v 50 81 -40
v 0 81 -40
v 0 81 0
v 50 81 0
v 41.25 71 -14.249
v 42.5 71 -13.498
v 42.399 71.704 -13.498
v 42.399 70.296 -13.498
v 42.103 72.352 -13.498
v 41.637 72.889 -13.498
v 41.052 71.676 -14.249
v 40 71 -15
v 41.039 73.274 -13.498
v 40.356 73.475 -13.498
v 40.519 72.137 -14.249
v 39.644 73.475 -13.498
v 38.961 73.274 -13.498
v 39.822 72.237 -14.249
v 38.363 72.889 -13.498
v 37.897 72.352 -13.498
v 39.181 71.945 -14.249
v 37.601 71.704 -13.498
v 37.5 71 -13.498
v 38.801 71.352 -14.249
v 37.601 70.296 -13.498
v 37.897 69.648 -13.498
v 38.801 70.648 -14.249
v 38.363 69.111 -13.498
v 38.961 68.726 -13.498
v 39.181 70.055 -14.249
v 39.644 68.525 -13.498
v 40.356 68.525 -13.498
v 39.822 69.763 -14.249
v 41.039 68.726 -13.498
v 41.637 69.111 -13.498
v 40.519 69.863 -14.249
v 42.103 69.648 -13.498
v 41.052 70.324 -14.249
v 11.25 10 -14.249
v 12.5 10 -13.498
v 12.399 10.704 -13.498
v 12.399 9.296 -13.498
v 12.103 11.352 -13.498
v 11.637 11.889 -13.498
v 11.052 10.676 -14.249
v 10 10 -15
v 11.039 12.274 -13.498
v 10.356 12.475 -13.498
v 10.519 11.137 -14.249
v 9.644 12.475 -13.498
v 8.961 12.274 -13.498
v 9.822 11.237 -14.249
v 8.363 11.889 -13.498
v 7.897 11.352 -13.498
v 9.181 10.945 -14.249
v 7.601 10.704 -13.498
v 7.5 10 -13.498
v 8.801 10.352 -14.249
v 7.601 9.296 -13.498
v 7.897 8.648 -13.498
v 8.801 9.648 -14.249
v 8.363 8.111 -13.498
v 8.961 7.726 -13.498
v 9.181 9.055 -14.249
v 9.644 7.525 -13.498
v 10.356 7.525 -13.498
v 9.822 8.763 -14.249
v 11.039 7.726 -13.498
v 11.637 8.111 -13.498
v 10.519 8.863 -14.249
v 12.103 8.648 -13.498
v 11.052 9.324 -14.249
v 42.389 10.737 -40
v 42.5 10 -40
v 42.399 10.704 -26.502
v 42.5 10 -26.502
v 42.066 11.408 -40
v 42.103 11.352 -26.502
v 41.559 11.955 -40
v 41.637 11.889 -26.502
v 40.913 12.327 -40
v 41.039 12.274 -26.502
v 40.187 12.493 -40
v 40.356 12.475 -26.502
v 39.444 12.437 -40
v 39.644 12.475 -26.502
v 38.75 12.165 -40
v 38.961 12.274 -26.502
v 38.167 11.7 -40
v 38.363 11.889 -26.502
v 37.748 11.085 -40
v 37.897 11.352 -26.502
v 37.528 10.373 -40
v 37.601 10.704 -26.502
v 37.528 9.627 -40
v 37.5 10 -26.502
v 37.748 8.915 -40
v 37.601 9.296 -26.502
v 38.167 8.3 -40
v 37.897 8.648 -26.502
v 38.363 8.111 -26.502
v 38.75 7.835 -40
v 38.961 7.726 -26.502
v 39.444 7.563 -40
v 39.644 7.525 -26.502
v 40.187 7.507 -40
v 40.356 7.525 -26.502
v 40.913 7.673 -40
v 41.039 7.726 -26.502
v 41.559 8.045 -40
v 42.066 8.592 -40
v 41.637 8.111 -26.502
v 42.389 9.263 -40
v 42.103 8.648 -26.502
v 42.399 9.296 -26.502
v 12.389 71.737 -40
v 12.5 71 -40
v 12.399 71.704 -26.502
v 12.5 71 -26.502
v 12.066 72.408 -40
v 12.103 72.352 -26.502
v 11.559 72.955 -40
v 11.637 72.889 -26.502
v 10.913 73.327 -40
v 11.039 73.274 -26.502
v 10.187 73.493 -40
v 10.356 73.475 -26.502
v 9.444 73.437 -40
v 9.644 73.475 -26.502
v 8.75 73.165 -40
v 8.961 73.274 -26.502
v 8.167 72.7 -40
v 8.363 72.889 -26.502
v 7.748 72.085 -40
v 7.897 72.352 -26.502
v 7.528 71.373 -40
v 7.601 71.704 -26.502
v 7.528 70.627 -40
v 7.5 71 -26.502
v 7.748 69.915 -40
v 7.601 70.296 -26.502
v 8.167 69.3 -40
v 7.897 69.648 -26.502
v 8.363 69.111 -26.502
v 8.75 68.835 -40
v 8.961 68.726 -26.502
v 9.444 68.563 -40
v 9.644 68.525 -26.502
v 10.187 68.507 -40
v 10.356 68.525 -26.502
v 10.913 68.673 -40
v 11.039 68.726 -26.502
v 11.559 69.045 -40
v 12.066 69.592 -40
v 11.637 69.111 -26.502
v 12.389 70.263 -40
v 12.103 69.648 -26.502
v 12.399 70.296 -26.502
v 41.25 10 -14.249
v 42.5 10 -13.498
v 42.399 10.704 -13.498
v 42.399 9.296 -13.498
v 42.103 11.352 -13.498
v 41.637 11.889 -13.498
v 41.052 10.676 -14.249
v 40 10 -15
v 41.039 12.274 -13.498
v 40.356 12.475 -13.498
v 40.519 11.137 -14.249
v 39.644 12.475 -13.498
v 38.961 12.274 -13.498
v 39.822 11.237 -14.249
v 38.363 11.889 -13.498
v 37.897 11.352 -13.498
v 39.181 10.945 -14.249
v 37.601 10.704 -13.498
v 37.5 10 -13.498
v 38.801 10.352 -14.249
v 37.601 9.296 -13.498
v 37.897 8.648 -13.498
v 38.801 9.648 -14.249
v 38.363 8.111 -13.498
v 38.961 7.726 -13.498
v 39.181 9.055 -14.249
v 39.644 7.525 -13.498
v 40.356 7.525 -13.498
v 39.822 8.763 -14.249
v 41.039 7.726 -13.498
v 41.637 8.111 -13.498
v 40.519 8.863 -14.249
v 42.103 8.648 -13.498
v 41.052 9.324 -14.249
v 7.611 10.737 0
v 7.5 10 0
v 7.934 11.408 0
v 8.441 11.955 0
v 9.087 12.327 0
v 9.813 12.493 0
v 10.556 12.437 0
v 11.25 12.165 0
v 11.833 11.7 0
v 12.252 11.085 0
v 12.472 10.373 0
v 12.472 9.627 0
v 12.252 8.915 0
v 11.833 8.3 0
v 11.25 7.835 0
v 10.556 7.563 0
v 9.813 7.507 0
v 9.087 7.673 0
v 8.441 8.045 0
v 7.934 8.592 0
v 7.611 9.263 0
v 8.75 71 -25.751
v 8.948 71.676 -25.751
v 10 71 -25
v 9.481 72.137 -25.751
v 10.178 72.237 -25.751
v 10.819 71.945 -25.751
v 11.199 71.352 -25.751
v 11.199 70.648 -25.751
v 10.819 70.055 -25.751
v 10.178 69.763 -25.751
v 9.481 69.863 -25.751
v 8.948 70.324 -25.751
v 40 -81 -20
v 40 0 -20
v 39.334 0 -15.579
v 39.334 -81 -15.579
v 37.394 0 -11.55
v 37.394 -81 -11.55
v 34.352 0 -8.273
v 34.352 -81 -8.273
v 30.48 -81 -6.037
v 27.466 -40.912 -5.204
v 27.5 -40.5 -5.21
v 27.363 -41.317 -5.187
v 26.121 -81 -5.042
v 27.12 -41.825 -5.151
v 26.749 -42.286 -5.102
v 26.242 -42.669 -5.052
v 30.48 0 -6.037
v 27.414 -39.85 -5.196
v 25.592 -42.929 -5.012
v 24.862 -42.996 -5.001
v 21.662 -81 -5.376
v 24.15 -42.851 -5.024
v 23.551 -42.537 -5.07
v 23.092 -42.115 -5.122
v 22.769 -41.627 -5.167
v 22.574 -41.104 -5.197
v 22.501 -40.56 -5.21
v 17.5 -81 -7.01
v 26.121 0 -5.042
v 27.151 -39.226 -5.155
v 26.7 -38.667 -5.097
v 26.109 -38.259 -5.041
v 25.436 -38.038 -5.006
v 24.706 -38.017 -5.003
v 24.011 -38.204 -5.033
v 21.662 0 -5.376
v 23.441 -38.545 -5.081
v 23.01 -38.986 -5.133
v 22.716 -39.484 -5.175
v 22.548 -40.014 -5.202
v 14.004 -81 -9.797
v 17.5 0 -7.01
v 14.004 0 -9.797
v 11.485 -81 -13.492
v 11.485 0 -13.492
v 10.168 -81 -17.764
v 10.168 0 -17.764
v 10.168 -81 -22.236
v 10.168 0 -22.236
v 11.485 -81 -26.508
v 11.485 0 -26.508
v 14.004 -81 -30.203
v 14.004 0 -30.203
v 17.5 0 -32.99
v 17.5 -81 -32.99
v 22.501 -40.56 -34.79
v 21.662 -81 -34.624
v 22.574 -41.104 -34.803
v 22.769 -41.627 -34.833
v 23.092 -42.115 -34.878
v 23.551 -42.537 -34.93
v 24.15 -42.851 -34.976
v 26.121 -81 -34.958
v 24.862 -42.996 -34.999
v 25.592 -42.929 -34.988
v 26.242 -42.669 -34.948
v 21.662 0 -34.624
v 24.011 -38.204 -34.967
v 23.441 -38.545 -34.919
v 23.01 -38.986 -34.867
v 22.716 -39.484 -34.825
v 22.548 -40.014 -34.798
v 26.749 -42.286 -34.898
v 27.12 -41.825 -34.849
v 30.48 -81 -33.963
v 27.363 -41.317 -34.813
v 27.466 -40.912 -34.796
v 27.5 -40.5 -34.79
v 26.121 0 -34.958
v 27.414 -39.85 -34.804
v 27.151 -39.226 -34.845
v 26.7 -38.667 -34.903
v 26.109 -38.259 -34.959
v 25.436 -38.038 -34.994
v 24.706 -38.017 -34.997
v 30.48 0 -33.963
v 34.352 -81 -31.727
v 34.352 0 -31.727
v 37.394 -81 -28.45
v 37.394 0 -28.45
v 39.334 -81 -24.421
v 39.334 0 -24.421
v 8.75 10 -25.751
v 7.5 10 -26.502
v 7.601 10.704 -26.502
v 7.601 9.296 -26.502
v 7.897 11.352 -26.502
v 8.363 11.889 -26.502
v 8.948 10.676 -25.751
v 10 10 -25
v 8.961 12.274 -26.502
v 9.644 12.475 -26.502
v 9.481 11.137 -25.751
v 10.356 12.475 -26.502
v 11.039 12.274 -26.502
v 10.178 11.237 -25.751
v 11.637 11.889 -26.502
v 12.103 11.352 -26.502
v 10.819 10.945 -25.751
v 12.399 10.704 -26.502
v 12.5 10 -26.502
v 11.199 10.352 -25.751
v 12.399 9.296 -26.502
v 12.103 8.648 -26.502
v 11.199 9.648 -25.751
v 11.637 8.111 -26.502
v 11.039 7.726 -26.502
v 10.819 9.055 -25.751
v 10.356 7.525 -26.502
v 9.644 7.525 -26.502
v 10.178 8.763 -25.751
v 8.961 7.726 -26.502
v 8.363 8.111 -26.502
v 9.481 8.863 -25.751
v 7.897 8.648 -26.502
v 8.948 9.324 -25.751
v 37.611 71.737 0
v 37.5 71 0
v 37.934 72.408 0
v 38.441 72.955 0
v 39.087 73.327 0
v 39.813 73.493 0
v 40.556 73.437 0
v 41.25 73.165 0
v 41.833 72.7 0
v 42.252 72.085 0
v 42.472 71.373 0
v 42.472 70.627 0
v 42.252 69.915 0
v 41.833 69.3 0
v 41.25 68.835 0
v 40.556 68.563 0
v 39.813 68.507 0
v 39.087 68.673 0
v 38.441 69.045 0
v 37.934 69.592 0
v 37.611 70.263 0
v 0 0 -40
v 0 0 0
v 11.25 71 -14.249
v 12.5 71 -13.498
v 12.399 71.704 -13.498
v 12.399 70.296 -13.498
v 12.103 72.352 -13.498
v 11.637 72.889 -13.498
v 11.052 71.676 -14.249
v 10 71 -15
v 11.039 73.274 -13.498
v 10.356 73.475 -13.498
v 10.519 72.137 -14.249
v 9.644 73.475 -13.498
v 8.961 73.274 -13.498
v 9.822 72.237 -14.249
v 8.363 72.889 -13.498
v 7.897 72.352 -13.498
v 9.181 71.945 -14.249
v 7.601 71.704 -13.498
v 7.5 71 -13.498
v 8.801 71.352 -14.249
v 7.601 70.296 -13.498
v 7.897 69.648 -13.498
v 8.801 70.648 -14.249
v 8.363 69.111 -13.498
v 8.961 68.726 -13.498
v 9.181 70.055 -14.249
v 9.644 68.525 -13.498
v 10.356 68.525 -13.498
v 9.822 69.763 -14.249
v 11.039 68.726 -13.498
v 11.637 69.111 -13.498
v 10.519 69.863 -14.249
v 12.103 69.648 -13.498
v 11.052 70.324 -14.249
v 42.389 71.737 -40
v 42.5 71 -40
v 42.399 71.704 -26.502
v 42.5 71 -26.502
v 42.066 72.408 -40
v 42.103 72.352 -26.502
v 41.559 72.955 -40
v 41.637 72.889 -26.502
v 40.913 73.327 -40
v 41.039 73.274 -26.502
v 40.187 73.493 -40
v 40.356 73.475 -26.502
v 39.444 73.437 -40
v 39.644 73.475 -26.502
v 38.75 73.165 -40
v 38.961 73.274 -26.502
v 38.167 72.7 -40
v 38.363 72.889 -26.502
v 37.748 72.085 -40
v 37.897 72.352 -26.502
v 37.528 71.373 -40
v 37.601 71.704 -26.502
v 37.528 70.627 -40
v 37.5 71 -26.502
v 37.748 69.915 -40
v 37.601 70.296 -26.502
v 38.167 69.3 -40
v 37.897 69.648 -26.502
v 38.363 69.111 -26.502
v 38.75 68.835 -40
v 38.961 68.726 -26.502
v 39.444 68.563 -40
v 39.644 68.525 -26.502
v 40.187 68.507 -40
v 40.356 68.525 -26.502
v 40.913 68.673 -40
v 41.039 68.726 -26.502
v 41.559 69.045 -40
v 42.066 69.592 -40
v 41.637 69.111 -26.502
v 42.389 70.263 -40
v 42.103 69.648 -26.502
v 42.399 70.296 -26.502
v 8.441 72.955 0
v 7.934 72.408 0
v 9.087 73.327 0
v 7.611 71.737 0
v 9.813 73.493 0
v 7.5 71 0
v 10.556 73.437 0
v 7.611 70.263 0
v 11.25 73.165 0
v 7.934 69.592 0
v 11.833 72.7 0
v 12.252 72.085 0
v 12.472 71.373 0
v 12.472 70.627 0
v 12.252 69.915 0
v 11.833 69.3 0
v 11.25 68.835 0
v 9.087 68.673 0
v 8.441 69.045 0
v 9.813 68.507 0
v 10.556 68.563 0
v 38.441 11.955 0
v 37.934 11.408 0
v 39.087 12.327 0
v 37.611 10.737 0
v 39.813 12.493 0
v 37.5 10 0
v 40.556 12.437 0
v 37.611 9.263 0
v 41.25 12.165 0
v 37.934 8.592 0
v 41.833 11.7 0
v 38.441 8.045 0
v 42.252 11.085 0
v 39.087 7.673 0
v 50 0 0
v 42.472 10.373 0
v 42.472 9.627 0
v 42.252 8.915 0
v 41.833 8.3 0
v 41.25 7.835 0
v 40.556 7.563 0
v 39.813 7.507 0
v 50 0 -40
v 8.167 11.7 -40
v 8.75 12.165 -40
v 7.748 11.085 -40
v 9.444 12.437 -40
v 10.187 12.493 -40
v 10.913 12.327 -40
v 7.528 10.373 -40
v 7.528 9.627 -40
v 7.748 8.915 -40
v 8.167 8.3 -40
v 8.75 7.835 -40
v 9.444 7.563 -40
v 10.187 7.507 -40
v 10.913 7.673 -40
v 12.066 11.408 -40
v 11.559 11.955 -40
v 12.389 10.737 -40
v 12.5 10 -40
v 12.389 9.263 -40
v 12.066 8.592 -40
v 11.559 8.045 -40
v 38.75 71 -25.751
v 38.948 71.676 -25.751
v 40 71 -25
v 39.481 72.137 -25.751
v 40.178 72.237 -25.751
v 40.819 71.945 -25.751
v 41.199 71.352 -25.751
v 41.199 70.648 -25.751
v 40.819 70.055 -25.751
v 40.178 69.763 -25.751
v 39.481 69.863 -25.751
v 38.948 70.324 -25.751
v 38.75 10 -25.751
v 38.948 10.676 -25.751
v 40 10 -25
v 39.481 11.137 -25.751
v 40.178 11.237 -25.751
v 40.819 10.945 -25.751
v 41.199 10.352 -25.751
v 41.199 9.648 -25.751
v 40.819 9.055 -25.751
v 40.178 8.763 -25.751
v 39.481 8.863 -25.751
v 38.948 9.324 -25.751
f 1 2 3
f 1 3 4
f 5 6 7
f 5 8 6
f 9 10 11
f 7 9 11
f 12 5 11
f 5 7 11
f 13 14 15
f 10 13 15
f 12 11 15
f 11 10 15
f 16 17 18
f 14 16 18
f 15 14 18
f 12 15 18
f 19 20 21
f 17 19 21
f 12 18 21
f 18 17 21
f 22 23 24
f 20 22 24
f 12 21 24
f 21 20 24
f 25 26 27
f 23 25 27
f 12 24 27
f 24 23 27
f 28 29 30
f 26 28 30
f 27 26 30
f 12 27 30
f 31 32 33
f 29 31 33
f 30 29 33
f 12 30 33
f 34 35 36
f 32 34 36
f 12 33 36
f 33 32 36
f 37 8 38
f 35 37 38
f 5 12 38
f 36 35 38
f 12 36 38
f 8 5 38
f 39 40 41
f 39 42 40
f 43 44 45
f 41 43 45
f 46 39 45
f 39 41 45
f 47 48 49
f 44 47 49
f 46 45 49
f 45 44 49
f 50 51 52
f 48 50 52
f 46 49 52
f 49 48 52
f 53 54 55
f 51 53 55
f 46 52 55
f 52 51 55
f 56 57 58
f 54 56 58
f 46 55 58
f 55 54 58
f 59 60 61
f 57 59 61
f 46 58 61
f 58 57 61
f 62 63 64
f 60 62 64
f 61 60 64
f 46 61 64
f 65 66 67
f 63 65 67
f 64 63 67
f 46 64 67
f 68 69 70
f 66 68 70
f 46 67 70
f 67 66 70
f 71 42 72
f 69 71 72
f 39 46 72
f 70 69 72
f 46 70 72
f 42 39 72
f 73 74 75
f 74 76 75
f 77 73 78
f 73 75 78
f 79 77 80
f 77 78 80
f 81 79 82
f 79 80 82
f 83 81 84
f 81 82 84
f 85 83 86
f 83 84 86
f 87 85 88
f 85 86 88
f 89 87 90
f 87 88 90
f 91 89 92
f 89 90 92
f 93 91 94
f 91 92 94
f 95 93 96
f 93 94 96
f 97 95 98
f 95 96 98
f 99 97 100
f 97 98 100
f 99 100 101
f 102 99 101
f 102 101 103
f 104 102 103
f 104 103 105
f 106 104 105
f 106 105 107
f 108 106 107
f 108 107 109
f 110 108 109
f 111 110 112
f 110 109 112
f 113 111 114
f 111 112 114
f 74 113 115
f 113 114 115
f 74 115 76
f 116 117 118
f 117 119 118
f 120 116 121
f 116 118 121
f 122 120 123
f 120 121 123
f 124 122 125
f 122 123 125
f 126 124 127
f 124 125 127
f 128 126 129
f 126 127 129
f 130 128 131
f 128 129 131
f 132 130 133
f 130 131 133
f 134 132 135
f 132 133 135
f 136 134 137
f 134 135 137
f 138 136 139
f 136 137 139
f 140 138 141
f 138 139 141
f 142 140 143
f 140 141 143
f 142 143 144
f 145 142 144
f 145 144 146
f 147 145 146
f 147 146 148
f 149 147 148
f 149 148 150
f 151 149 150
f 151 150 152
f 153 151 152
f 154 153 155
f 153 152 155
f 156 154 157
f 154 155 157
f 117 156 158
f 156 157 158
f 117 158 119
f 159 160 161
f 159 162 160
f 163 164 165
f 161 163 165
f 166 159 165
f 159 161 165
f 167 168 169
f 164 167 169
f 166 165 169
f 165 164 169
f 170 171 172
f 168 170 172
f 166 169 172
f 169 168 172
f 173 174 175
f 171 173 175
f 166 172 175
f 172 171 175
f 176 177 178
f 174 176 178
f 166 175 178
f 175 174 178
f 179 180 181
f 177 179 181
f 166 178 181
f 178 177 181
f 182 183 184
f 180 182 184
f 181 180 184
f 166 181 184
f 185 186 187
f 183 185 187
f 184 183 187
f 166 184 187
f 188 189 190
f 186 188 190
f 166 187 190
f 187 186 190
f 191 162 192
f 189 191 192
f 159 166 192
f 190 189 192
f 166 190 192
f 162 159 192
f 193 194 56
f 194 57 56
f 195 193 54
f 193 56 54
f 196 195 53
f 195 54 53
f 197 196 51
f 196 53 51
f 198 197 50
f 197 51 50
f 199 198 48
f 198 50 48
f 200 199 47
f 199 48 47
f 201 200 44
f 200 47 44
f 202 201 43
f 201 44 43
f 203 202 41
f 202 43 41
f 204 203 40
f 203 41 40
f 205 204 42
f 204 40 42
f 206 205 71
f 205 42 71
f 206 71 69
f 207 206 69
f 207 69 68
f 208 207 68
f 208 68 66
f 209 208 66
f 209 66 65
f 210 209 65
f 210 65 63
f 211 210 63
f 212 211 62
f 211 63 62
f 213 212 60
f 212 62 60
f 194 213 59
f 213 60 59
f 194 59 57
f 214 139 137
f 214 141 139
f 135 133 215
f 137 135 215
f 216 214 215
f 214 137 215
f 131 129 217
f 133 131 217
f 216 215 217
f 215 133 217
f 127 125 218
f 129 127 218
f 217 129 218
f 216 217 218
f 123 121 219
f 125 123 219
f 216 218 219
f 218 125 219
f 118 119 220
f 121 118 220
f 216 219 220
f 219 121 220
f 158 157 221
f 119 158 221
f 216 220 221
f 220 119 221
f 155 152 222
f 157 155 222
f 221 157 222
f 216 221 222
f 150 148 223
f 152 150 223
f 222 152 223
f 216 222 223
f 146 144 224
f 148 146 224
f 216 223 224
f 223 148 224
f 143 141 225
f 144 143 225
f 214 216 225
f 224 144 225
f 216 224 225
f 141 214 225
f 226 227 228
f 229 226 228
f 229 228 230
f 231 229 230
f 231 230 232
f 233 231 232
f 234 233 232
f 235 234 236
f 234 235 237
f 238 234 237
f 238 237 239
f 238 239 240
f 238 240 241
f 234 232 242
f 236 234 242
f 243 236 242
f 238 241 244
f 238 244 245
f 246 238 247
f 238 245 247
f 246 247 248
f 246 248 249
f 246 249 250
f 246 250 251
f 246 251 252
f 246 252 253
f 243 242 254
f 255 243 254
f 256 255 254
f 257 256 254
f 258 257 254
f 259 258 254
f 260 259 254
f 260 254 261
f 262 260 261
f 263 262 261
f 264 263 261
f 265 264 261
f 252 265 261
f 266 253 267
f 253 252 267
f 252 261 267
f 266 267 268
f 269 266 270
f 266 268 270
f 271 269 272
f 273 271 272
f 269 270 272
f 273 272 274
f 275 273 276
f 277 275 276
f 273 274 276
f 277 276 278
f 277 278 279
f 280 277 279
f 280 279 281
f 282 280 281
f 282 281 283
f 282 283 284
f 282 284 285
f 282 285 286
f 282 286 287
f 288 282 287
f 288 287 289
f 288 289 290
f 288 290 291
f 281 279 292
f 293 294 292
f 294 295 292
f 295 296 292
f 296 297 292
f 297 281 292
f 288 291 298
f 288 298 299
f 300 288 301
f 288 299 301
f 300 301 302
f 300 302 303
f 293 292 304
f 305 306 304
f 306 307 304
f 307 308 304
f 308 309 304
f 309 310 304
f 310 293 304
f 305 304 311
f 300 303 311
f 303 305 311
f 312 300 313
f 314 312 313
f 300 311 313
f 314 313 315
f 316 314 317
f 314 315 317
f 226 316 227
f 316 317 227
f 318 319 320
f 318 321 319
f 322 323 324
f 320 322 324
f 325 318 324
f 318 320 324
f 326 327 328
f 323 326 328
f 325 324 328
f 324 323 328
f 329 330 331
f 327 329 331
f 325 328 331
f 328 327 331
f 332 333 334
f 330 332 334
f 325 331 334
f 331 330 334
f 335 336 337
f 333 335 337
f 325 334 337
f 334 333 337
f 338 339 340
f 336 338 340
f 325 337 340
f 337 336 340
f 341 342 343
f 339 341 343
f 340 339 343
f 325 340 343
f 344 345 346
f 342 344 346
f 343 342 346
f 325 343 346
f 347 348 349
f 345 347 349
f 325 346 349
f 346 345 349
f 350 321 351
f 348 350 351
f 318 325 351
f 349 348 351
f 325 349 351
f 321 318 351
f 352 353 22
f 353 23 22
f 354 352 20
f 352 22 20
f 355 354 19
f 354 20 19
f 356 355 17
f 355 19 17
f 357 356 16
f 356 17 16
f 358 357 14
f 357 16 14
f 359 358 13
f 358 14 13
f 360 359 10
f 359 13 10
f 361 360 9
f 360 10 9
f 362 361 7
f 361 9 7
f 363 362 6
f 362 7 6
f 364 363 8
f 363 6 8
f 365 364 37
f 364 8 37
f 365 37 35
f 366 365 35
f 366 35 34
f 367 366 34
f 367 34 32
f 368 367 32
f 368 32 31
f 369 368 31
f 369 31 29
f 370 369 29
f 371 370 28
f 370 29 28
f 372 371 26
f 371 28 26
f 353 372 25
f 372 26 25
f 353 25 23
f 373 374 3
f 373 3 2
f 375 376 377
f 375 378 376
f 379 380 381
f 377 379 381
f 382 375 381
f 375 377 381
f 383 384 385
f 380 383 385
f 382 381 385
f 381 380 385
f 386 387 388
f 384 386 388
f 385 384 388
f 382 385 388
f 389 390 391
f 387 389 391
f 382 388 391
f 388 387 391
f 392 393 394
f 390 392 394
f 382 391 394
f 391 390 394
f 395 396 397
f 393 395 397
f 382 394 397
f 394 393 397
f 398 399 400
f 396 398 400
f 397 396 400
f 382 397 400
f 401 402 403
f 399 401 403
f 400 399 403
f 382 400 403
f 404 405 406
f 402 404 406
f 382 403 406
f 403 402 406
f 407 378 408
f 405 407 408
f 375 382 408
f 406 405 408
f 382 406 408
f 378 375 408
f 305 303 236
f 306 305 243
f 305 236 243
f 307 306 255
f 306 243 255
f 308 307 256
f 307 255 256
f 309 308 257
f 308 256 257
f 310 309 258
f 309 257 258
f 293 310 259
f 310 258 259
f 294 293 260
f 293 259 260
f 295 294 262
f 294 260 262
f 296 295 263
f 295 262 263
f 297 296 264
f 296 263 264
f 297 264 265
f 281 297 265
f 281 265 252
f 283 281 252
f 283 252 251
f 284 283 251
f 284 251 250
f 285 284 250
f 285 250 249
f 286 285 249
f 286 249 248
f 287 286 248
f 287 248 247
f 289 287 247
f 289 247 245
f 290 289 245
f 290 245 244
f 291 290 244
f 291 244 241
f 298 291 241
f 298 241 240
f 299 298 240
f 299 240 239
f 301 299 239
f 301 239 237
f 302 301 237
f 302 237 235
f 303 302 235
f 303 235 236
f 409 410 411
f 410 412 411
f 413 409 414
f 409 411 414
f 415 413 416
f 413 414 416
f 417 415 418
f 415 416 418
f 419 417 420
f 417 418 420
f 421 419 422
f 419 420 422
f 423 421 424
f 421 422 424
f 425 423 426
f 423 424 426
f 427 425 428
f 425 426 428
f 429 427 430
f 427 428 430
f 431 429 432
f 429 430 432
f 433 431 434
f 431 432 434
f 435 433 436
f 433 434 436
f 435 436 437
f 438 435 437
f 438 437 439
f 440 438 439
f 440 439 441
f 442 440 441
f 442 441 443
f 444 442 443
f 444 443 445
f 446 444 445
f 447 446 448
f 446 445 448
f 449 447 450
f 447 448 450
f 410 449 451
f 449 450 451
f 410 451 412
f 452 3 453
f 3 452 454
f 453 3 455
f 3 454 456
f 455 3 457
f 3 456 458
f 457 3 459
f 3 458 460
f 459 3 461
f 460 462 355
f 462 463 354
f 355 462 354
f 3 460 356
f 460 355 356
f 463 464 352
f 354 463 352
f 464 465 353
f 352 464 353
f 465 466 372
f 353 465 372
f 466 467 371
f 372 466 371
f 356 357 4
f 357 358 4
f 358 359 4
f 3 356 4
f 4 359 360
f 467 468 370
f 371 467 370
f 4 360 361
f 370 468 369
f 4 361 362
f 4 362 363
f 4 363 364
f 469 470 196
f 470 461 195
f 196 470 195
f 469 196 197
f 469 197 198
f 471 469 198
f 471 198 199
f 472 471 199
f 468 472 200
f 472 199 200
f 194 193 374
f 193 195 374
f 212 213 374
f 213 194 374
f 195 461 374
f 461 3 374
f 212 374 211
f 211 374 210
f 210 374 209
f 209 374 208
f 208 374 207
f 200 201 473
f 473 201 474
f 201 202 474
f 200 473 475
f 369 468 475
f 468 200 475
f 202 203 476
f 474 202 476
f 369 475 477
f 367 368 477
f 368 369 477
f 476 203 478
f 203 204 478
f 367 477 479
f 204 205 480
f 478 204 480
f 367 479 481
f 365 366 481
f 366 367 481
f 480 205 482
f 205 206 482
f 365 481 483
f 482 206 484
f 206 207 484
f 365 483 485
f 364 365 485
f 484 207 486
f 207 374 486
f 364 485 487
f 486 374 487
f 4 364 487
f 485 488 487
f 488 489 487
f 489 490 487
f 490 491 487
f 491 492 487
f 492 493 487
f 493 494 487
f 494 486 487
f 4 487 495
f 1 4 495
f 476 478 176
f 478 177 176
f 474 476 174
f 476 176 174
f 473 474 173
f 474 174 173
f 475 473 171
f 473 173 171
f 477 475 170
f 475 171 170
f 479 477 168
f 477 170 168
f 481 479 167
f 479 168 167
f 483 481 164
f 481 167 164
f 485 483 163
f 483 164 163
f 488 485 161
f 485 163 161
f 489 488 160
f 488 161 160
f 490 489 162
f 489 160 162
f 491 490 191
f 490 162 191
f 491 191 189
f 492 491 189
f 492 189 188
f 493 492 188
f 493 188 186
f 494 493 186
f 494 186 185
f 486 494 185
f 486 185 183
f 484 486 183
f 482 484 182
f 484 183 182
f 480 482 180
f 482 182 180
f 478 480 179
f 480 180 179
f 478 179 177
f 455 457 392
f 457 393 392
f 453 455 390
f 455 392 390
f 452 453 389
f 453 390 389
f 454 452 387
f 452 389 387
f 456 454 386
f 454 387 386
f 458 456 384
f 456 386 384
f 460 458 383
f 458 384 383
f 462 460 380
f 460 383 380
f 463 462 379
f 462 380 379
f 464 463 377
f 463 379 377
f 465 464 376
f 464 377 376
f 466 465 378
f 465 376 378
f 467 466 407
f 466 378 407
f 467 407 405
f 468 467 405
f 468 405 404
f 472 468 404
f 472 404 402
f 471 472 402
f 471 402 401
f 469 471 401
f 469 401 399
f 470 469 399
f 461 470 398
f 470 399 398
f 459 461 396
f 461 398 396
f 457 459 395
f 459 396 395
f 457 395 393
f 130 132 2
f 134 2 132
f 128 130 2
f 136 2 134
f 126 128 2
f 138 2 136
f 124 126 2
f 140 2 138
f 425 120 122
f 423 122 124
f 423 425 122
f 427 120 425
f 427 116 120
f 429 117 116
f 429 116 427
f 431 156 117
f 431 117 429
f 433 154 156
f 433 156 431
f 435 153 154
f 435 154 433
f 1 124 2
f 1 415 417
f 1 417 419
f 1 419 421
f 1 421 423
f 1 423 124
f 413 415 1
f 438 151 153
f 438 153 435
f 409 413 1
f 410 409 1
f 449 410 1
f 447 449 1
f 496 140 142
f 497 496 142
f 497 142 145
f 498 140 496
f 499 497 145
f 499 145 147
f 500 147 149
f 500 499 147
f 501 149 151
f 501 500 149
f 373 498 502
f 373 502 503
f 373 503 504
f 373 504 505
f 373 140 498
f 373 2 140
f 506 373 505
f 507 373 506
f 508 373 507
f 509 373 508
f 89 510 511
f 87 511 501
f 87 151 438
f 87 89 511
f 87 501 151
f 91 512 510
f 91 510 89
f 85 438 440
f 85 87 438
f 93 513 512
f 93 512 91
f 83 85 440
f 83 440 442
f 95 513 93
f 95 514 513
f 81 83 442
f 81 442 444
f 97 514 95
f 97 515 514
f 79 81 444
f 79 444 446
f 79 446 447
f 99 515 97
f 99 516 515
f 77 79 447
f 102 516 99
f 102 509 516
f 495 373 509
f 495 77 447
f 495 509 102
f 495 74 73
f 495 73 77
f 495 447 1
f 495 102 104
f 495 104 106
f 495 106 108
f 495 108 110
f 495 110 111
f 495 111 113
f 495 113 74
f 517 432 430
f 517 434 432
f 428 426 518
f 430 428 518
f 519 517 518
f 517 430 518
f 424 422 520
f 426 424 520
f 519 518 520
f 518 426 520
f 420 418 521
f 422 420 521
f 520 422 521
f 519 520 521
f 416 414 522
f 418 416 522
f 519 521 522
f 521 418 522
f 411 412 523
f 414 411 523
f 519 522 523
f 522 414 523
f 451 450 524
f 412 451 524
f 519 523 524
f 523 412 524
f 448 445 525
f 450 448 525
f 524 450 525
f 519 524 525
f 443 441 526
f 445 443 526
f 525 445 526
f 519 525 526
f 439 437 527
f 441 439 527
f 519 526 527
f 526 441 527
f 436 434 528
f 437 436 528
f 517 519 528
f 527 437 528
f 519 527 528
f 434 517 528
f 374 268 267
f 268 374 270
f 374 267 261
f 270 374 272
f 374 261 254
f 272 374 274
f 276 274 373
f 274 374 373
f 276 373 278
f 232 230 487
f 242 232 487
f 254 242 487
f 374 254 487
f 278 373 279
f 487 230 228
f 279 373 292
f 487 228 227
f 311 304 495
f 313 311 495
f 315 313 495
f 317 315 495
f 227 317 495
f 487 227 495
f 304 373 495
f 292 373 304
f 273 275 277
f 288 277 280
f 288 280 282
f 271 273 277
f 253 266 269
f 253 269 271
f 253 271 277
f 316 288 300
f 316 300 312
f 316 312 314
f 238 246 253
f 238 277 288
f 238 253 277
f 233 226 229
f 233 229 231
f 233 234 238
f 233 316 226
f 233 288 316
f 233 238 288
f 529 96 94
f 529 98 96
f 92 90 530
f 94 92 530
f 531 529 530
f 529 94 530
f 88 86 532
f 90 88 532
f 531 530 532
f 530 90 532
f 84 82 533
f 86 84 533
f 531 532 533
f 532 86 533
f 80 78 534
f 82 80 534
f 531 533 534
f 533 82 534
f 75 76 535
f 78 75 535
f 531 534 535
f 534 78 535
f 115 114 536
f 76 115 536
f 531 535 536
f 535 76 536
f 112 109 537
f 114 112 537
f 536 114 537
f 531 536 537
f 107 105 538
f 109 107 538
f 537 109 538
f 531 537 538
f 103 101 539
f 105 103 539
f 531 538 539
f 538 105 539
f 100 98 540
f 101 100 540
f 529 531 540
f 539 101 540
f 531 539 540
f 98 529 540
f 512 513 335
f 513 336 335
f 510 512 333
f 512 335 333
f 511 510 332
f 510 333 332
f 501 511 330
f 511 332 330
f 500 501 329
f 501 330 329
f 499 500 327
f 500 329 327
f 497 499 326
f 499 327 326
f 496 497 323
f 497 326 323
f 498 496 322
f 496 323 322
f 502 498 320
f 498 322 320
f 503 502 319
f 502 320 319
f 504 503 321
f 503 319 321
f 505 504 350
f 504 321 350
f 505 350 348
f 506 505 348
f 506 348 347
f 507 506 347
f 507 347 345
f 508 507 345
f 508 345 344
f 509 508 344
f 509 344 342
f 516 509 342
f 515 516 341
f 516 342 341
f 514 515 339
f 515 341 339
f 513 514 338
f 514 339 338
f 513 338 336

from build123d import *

# Parameters (mm, degrees)
SKETCH1_W             = 50
SKETCH1_H             = 40
BOSS_EXTRUDE1_DEPTH   = 81
SKETCH2_R             = 15
BOSS_EXTRUDE2_DEPTH   = 81
SKETCH3_R             = 2.5
CUT_EXTRUDE1_DEPTH    = 41
M6_TAPPED_HOLE1_D     = 5
M6_TAPPED_HOLE1_DEPTH = 13.497848452
M6_TAPPED_HOLE1_TIP   = 1.502151548
M6_TAPPED_HOLE4_D     = 5
M6_TAPPED_HOLE4_DEPTH = 13.497848452
M6_TAPPED_HOLE4_TIP   = 1.502151548


with BuildPart() as part:
    # Sketch1 → Boss-Extrude1 (new body)
    with BuildSketch(Plane(origin=(0, 0, 0), x_dir=(1, 0, 0), z_dir=(0, 1, 0))):
        with Locations((25, 20)):
            Rectangle(SKETCH1_W, SKETCH1_H)
    extrude(amount=BOSS_EXTRUDE1_DEPTH)

    # Sketch2 → Boss-Extrude2 (add)
    with BuildSketch(Plane.XZ):
        with Locations((25, -20)):
            Circle(SKETCH2_R)
    extrude(amount=BOSS_EXTRUDE2_DEPTH)

    # Sketch3 → Cut-Extrude1 (cut, through all)
    with BuildSketch(Plane.XY):
        with Locations((25, -40.5)):
            Circle(SKETCH3_R)
    extrude(amount=-CUT_EXTRUDE1_DEPTH, mode=Mode.SUBTRACT)

    # M6 Tapped Hole1
    with Locations(Plane.XY):
        with Locations((10, 10), (40, 10), (40, 71), (10, 71)):
            Hole(M6_TAPPED_HOLE1_D / 2, depth=M6_TAPPED_HOLE1_DEPTH)
            with Locations((0, 0, -(M6_TAPPED_HOLE1_DEPTH + M6_TAPPED_HOLE1_TIP / 2))):  # 118° drill point
                Cone(0, M6_TAPPED_HOLE1_D / 2, M6_TAPPED_HOLE1_TIP, mode=Mode.SUBTRACT)

    # M6 Tapped Hole4
    with Locations(Plane(origin=(50.277007324, 10.627759916, -40), x_dir=(-1, 0, 0), z_dir=(0, 0, -1))):
        with Locations((10.277007324, -0.627759916), (40.277007324, -0.627759916), (40.277007324, 60.372240084), (10.277007324, 60.372240084)):
            Hole(M6_TAPPED_HOLE4_D / 2, depth=M6_TAPPED_HOLE4_DEPTH)
            with Locations((0, 0, -(M6_TAPPED_HOLE4_DEPTH + M6_TAPPED_HOLE4_TIP / 2))):  # 118° drill point
                Cone(0, M6_TAPPED_HOLE4_D / 2, M6_TAPPED_HOLE4_TIP, mode=Mode.SUBTRACT)


solid = part.part
